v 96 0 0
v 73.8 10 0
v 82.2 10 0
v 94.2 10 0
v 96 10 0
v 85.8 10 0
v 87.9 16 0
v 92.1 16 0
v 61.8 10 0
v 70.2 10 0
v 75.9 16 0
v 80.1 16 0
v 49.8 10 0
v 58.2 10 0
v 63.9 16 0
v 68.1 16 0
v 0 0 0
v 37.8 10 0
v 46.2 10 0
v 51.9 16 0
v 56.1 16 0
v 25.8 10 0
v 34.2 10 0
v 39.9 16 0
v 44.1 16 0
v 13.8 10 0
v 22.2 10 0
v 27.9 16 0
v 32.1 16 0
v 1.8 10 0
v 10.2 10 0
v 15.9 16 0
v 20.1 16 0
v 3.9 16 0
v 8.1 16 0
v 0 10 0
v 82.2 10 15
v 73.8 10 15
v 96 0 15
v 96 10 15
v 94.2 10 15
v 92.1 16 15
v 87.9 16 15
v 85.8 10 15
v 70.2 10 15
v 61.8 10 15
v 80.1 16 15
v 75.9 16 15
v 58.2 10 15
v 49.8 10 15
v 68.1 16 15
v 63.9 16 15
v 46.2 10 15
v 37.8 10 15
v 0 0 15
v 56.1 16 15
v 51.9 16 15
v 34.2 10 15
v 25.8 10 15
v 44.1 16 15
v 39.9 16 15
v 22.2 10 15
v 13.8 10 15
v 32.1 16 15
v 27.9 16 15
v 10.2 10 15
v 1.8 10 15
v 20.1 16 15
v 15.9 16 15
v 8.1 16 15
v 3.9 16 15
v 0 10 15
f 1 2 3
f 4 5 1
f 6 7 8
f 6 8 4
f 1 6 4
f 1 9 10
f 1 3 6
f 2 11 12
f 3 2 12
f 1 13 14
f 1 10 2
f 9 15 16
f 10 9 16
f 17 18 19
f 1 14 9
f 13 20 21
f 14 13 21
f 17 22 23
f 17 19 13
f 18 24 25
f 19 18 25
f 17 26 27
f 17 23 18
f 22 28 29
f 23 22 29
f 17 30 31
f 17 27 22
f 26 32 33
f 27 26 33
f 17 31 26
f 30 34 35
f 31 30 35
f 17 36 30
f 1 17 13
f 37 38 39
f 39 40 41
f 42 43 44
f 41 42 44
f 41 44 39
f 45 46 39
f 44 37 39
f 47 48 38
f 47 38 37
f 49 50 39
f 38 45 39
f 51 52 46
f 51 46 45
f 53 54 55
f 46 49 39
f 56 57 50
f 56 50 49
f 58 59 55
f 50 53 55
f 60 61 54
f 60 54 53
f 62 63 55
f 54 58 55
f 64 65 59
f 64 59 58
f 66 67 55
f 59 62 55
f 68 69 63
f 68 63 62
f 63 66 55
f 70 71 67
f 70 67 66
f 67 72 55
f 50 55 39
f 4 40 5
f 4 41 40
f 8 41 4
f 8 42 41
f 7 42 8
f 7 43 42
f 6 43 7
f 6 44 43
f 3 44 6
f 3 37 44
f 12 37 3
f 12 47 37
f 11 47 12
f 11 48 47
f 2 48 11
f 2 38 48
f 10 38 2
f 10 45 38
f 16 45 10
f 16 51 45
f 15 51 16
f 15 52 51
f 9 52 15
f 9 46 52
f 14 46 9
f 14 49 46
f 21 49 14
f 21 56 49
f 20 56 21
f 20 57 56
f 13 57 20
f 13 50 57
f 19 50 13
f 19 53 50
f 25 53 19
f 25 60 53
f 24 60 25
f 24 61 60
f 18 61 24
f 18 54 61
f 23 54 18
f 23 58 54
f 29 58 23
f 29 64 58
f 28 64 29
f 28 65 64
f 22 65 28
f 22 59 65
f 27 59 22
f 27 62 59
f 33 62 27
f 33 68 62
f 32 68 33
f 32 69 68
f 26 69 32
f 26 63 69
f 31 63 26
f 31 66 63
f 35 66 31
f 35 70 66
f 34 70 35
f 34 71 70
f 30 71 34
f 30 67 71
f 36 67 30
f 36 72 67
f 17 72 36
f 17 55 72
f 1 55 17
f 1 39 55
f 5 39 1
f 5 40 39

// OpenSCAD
$fn = 32;

// ----------------------------------------------------------------------
// Gear rack: 8 teeth, pitch 12 mm
// ----------------------------------------------------------------------

// --- parameters (mm) ---
teeth = 8;                // number of teeth
pitch = 12;               // tooth pitch, X
root_w = 8.4;             // tooth width at the root
tip_w = 4.2;              // tooth width at the tip
base_h = 10;              // rack body height, Y
tooth_h = 6;              // tooth height above the body
plate_t = 15;             // rack width, Z (extrusion height)

rack_l = teeth * pitch;  // overall length
total_h = base_h + tooth_h;  // overall height

profile = [[0, 0], [96, 0], [96, 10], [94.2, 10], [92.1, 16], [87.9, 16], [85.8, 10], [82.2, 10], [80.1, 16], [75.9, 16], [73.8, 10], [70.2, 10], [68.1, 16], [63.9, 16], [61.8, 10], [58.2, 10], [56.1, 16], [51.9, 16], [49.8, 10], [46.2, 10], [44.1, 16], [39.9, 16], [37.8, 10], [34.2, 10], [32.1, 16], [27.9, 16], [25.8, 10], [22.2, 10], [20.1, 16], [15.9, 16], [13.8, 10], [10.2, 10], [8.1, 16], [3.9, 16], [1.8, 10], [0, 10]];  // primary outline, 36 points, counter clockwise

// --- the one profile operation ---
linear_extrude(height = plate_t) polygon(points = profile);
